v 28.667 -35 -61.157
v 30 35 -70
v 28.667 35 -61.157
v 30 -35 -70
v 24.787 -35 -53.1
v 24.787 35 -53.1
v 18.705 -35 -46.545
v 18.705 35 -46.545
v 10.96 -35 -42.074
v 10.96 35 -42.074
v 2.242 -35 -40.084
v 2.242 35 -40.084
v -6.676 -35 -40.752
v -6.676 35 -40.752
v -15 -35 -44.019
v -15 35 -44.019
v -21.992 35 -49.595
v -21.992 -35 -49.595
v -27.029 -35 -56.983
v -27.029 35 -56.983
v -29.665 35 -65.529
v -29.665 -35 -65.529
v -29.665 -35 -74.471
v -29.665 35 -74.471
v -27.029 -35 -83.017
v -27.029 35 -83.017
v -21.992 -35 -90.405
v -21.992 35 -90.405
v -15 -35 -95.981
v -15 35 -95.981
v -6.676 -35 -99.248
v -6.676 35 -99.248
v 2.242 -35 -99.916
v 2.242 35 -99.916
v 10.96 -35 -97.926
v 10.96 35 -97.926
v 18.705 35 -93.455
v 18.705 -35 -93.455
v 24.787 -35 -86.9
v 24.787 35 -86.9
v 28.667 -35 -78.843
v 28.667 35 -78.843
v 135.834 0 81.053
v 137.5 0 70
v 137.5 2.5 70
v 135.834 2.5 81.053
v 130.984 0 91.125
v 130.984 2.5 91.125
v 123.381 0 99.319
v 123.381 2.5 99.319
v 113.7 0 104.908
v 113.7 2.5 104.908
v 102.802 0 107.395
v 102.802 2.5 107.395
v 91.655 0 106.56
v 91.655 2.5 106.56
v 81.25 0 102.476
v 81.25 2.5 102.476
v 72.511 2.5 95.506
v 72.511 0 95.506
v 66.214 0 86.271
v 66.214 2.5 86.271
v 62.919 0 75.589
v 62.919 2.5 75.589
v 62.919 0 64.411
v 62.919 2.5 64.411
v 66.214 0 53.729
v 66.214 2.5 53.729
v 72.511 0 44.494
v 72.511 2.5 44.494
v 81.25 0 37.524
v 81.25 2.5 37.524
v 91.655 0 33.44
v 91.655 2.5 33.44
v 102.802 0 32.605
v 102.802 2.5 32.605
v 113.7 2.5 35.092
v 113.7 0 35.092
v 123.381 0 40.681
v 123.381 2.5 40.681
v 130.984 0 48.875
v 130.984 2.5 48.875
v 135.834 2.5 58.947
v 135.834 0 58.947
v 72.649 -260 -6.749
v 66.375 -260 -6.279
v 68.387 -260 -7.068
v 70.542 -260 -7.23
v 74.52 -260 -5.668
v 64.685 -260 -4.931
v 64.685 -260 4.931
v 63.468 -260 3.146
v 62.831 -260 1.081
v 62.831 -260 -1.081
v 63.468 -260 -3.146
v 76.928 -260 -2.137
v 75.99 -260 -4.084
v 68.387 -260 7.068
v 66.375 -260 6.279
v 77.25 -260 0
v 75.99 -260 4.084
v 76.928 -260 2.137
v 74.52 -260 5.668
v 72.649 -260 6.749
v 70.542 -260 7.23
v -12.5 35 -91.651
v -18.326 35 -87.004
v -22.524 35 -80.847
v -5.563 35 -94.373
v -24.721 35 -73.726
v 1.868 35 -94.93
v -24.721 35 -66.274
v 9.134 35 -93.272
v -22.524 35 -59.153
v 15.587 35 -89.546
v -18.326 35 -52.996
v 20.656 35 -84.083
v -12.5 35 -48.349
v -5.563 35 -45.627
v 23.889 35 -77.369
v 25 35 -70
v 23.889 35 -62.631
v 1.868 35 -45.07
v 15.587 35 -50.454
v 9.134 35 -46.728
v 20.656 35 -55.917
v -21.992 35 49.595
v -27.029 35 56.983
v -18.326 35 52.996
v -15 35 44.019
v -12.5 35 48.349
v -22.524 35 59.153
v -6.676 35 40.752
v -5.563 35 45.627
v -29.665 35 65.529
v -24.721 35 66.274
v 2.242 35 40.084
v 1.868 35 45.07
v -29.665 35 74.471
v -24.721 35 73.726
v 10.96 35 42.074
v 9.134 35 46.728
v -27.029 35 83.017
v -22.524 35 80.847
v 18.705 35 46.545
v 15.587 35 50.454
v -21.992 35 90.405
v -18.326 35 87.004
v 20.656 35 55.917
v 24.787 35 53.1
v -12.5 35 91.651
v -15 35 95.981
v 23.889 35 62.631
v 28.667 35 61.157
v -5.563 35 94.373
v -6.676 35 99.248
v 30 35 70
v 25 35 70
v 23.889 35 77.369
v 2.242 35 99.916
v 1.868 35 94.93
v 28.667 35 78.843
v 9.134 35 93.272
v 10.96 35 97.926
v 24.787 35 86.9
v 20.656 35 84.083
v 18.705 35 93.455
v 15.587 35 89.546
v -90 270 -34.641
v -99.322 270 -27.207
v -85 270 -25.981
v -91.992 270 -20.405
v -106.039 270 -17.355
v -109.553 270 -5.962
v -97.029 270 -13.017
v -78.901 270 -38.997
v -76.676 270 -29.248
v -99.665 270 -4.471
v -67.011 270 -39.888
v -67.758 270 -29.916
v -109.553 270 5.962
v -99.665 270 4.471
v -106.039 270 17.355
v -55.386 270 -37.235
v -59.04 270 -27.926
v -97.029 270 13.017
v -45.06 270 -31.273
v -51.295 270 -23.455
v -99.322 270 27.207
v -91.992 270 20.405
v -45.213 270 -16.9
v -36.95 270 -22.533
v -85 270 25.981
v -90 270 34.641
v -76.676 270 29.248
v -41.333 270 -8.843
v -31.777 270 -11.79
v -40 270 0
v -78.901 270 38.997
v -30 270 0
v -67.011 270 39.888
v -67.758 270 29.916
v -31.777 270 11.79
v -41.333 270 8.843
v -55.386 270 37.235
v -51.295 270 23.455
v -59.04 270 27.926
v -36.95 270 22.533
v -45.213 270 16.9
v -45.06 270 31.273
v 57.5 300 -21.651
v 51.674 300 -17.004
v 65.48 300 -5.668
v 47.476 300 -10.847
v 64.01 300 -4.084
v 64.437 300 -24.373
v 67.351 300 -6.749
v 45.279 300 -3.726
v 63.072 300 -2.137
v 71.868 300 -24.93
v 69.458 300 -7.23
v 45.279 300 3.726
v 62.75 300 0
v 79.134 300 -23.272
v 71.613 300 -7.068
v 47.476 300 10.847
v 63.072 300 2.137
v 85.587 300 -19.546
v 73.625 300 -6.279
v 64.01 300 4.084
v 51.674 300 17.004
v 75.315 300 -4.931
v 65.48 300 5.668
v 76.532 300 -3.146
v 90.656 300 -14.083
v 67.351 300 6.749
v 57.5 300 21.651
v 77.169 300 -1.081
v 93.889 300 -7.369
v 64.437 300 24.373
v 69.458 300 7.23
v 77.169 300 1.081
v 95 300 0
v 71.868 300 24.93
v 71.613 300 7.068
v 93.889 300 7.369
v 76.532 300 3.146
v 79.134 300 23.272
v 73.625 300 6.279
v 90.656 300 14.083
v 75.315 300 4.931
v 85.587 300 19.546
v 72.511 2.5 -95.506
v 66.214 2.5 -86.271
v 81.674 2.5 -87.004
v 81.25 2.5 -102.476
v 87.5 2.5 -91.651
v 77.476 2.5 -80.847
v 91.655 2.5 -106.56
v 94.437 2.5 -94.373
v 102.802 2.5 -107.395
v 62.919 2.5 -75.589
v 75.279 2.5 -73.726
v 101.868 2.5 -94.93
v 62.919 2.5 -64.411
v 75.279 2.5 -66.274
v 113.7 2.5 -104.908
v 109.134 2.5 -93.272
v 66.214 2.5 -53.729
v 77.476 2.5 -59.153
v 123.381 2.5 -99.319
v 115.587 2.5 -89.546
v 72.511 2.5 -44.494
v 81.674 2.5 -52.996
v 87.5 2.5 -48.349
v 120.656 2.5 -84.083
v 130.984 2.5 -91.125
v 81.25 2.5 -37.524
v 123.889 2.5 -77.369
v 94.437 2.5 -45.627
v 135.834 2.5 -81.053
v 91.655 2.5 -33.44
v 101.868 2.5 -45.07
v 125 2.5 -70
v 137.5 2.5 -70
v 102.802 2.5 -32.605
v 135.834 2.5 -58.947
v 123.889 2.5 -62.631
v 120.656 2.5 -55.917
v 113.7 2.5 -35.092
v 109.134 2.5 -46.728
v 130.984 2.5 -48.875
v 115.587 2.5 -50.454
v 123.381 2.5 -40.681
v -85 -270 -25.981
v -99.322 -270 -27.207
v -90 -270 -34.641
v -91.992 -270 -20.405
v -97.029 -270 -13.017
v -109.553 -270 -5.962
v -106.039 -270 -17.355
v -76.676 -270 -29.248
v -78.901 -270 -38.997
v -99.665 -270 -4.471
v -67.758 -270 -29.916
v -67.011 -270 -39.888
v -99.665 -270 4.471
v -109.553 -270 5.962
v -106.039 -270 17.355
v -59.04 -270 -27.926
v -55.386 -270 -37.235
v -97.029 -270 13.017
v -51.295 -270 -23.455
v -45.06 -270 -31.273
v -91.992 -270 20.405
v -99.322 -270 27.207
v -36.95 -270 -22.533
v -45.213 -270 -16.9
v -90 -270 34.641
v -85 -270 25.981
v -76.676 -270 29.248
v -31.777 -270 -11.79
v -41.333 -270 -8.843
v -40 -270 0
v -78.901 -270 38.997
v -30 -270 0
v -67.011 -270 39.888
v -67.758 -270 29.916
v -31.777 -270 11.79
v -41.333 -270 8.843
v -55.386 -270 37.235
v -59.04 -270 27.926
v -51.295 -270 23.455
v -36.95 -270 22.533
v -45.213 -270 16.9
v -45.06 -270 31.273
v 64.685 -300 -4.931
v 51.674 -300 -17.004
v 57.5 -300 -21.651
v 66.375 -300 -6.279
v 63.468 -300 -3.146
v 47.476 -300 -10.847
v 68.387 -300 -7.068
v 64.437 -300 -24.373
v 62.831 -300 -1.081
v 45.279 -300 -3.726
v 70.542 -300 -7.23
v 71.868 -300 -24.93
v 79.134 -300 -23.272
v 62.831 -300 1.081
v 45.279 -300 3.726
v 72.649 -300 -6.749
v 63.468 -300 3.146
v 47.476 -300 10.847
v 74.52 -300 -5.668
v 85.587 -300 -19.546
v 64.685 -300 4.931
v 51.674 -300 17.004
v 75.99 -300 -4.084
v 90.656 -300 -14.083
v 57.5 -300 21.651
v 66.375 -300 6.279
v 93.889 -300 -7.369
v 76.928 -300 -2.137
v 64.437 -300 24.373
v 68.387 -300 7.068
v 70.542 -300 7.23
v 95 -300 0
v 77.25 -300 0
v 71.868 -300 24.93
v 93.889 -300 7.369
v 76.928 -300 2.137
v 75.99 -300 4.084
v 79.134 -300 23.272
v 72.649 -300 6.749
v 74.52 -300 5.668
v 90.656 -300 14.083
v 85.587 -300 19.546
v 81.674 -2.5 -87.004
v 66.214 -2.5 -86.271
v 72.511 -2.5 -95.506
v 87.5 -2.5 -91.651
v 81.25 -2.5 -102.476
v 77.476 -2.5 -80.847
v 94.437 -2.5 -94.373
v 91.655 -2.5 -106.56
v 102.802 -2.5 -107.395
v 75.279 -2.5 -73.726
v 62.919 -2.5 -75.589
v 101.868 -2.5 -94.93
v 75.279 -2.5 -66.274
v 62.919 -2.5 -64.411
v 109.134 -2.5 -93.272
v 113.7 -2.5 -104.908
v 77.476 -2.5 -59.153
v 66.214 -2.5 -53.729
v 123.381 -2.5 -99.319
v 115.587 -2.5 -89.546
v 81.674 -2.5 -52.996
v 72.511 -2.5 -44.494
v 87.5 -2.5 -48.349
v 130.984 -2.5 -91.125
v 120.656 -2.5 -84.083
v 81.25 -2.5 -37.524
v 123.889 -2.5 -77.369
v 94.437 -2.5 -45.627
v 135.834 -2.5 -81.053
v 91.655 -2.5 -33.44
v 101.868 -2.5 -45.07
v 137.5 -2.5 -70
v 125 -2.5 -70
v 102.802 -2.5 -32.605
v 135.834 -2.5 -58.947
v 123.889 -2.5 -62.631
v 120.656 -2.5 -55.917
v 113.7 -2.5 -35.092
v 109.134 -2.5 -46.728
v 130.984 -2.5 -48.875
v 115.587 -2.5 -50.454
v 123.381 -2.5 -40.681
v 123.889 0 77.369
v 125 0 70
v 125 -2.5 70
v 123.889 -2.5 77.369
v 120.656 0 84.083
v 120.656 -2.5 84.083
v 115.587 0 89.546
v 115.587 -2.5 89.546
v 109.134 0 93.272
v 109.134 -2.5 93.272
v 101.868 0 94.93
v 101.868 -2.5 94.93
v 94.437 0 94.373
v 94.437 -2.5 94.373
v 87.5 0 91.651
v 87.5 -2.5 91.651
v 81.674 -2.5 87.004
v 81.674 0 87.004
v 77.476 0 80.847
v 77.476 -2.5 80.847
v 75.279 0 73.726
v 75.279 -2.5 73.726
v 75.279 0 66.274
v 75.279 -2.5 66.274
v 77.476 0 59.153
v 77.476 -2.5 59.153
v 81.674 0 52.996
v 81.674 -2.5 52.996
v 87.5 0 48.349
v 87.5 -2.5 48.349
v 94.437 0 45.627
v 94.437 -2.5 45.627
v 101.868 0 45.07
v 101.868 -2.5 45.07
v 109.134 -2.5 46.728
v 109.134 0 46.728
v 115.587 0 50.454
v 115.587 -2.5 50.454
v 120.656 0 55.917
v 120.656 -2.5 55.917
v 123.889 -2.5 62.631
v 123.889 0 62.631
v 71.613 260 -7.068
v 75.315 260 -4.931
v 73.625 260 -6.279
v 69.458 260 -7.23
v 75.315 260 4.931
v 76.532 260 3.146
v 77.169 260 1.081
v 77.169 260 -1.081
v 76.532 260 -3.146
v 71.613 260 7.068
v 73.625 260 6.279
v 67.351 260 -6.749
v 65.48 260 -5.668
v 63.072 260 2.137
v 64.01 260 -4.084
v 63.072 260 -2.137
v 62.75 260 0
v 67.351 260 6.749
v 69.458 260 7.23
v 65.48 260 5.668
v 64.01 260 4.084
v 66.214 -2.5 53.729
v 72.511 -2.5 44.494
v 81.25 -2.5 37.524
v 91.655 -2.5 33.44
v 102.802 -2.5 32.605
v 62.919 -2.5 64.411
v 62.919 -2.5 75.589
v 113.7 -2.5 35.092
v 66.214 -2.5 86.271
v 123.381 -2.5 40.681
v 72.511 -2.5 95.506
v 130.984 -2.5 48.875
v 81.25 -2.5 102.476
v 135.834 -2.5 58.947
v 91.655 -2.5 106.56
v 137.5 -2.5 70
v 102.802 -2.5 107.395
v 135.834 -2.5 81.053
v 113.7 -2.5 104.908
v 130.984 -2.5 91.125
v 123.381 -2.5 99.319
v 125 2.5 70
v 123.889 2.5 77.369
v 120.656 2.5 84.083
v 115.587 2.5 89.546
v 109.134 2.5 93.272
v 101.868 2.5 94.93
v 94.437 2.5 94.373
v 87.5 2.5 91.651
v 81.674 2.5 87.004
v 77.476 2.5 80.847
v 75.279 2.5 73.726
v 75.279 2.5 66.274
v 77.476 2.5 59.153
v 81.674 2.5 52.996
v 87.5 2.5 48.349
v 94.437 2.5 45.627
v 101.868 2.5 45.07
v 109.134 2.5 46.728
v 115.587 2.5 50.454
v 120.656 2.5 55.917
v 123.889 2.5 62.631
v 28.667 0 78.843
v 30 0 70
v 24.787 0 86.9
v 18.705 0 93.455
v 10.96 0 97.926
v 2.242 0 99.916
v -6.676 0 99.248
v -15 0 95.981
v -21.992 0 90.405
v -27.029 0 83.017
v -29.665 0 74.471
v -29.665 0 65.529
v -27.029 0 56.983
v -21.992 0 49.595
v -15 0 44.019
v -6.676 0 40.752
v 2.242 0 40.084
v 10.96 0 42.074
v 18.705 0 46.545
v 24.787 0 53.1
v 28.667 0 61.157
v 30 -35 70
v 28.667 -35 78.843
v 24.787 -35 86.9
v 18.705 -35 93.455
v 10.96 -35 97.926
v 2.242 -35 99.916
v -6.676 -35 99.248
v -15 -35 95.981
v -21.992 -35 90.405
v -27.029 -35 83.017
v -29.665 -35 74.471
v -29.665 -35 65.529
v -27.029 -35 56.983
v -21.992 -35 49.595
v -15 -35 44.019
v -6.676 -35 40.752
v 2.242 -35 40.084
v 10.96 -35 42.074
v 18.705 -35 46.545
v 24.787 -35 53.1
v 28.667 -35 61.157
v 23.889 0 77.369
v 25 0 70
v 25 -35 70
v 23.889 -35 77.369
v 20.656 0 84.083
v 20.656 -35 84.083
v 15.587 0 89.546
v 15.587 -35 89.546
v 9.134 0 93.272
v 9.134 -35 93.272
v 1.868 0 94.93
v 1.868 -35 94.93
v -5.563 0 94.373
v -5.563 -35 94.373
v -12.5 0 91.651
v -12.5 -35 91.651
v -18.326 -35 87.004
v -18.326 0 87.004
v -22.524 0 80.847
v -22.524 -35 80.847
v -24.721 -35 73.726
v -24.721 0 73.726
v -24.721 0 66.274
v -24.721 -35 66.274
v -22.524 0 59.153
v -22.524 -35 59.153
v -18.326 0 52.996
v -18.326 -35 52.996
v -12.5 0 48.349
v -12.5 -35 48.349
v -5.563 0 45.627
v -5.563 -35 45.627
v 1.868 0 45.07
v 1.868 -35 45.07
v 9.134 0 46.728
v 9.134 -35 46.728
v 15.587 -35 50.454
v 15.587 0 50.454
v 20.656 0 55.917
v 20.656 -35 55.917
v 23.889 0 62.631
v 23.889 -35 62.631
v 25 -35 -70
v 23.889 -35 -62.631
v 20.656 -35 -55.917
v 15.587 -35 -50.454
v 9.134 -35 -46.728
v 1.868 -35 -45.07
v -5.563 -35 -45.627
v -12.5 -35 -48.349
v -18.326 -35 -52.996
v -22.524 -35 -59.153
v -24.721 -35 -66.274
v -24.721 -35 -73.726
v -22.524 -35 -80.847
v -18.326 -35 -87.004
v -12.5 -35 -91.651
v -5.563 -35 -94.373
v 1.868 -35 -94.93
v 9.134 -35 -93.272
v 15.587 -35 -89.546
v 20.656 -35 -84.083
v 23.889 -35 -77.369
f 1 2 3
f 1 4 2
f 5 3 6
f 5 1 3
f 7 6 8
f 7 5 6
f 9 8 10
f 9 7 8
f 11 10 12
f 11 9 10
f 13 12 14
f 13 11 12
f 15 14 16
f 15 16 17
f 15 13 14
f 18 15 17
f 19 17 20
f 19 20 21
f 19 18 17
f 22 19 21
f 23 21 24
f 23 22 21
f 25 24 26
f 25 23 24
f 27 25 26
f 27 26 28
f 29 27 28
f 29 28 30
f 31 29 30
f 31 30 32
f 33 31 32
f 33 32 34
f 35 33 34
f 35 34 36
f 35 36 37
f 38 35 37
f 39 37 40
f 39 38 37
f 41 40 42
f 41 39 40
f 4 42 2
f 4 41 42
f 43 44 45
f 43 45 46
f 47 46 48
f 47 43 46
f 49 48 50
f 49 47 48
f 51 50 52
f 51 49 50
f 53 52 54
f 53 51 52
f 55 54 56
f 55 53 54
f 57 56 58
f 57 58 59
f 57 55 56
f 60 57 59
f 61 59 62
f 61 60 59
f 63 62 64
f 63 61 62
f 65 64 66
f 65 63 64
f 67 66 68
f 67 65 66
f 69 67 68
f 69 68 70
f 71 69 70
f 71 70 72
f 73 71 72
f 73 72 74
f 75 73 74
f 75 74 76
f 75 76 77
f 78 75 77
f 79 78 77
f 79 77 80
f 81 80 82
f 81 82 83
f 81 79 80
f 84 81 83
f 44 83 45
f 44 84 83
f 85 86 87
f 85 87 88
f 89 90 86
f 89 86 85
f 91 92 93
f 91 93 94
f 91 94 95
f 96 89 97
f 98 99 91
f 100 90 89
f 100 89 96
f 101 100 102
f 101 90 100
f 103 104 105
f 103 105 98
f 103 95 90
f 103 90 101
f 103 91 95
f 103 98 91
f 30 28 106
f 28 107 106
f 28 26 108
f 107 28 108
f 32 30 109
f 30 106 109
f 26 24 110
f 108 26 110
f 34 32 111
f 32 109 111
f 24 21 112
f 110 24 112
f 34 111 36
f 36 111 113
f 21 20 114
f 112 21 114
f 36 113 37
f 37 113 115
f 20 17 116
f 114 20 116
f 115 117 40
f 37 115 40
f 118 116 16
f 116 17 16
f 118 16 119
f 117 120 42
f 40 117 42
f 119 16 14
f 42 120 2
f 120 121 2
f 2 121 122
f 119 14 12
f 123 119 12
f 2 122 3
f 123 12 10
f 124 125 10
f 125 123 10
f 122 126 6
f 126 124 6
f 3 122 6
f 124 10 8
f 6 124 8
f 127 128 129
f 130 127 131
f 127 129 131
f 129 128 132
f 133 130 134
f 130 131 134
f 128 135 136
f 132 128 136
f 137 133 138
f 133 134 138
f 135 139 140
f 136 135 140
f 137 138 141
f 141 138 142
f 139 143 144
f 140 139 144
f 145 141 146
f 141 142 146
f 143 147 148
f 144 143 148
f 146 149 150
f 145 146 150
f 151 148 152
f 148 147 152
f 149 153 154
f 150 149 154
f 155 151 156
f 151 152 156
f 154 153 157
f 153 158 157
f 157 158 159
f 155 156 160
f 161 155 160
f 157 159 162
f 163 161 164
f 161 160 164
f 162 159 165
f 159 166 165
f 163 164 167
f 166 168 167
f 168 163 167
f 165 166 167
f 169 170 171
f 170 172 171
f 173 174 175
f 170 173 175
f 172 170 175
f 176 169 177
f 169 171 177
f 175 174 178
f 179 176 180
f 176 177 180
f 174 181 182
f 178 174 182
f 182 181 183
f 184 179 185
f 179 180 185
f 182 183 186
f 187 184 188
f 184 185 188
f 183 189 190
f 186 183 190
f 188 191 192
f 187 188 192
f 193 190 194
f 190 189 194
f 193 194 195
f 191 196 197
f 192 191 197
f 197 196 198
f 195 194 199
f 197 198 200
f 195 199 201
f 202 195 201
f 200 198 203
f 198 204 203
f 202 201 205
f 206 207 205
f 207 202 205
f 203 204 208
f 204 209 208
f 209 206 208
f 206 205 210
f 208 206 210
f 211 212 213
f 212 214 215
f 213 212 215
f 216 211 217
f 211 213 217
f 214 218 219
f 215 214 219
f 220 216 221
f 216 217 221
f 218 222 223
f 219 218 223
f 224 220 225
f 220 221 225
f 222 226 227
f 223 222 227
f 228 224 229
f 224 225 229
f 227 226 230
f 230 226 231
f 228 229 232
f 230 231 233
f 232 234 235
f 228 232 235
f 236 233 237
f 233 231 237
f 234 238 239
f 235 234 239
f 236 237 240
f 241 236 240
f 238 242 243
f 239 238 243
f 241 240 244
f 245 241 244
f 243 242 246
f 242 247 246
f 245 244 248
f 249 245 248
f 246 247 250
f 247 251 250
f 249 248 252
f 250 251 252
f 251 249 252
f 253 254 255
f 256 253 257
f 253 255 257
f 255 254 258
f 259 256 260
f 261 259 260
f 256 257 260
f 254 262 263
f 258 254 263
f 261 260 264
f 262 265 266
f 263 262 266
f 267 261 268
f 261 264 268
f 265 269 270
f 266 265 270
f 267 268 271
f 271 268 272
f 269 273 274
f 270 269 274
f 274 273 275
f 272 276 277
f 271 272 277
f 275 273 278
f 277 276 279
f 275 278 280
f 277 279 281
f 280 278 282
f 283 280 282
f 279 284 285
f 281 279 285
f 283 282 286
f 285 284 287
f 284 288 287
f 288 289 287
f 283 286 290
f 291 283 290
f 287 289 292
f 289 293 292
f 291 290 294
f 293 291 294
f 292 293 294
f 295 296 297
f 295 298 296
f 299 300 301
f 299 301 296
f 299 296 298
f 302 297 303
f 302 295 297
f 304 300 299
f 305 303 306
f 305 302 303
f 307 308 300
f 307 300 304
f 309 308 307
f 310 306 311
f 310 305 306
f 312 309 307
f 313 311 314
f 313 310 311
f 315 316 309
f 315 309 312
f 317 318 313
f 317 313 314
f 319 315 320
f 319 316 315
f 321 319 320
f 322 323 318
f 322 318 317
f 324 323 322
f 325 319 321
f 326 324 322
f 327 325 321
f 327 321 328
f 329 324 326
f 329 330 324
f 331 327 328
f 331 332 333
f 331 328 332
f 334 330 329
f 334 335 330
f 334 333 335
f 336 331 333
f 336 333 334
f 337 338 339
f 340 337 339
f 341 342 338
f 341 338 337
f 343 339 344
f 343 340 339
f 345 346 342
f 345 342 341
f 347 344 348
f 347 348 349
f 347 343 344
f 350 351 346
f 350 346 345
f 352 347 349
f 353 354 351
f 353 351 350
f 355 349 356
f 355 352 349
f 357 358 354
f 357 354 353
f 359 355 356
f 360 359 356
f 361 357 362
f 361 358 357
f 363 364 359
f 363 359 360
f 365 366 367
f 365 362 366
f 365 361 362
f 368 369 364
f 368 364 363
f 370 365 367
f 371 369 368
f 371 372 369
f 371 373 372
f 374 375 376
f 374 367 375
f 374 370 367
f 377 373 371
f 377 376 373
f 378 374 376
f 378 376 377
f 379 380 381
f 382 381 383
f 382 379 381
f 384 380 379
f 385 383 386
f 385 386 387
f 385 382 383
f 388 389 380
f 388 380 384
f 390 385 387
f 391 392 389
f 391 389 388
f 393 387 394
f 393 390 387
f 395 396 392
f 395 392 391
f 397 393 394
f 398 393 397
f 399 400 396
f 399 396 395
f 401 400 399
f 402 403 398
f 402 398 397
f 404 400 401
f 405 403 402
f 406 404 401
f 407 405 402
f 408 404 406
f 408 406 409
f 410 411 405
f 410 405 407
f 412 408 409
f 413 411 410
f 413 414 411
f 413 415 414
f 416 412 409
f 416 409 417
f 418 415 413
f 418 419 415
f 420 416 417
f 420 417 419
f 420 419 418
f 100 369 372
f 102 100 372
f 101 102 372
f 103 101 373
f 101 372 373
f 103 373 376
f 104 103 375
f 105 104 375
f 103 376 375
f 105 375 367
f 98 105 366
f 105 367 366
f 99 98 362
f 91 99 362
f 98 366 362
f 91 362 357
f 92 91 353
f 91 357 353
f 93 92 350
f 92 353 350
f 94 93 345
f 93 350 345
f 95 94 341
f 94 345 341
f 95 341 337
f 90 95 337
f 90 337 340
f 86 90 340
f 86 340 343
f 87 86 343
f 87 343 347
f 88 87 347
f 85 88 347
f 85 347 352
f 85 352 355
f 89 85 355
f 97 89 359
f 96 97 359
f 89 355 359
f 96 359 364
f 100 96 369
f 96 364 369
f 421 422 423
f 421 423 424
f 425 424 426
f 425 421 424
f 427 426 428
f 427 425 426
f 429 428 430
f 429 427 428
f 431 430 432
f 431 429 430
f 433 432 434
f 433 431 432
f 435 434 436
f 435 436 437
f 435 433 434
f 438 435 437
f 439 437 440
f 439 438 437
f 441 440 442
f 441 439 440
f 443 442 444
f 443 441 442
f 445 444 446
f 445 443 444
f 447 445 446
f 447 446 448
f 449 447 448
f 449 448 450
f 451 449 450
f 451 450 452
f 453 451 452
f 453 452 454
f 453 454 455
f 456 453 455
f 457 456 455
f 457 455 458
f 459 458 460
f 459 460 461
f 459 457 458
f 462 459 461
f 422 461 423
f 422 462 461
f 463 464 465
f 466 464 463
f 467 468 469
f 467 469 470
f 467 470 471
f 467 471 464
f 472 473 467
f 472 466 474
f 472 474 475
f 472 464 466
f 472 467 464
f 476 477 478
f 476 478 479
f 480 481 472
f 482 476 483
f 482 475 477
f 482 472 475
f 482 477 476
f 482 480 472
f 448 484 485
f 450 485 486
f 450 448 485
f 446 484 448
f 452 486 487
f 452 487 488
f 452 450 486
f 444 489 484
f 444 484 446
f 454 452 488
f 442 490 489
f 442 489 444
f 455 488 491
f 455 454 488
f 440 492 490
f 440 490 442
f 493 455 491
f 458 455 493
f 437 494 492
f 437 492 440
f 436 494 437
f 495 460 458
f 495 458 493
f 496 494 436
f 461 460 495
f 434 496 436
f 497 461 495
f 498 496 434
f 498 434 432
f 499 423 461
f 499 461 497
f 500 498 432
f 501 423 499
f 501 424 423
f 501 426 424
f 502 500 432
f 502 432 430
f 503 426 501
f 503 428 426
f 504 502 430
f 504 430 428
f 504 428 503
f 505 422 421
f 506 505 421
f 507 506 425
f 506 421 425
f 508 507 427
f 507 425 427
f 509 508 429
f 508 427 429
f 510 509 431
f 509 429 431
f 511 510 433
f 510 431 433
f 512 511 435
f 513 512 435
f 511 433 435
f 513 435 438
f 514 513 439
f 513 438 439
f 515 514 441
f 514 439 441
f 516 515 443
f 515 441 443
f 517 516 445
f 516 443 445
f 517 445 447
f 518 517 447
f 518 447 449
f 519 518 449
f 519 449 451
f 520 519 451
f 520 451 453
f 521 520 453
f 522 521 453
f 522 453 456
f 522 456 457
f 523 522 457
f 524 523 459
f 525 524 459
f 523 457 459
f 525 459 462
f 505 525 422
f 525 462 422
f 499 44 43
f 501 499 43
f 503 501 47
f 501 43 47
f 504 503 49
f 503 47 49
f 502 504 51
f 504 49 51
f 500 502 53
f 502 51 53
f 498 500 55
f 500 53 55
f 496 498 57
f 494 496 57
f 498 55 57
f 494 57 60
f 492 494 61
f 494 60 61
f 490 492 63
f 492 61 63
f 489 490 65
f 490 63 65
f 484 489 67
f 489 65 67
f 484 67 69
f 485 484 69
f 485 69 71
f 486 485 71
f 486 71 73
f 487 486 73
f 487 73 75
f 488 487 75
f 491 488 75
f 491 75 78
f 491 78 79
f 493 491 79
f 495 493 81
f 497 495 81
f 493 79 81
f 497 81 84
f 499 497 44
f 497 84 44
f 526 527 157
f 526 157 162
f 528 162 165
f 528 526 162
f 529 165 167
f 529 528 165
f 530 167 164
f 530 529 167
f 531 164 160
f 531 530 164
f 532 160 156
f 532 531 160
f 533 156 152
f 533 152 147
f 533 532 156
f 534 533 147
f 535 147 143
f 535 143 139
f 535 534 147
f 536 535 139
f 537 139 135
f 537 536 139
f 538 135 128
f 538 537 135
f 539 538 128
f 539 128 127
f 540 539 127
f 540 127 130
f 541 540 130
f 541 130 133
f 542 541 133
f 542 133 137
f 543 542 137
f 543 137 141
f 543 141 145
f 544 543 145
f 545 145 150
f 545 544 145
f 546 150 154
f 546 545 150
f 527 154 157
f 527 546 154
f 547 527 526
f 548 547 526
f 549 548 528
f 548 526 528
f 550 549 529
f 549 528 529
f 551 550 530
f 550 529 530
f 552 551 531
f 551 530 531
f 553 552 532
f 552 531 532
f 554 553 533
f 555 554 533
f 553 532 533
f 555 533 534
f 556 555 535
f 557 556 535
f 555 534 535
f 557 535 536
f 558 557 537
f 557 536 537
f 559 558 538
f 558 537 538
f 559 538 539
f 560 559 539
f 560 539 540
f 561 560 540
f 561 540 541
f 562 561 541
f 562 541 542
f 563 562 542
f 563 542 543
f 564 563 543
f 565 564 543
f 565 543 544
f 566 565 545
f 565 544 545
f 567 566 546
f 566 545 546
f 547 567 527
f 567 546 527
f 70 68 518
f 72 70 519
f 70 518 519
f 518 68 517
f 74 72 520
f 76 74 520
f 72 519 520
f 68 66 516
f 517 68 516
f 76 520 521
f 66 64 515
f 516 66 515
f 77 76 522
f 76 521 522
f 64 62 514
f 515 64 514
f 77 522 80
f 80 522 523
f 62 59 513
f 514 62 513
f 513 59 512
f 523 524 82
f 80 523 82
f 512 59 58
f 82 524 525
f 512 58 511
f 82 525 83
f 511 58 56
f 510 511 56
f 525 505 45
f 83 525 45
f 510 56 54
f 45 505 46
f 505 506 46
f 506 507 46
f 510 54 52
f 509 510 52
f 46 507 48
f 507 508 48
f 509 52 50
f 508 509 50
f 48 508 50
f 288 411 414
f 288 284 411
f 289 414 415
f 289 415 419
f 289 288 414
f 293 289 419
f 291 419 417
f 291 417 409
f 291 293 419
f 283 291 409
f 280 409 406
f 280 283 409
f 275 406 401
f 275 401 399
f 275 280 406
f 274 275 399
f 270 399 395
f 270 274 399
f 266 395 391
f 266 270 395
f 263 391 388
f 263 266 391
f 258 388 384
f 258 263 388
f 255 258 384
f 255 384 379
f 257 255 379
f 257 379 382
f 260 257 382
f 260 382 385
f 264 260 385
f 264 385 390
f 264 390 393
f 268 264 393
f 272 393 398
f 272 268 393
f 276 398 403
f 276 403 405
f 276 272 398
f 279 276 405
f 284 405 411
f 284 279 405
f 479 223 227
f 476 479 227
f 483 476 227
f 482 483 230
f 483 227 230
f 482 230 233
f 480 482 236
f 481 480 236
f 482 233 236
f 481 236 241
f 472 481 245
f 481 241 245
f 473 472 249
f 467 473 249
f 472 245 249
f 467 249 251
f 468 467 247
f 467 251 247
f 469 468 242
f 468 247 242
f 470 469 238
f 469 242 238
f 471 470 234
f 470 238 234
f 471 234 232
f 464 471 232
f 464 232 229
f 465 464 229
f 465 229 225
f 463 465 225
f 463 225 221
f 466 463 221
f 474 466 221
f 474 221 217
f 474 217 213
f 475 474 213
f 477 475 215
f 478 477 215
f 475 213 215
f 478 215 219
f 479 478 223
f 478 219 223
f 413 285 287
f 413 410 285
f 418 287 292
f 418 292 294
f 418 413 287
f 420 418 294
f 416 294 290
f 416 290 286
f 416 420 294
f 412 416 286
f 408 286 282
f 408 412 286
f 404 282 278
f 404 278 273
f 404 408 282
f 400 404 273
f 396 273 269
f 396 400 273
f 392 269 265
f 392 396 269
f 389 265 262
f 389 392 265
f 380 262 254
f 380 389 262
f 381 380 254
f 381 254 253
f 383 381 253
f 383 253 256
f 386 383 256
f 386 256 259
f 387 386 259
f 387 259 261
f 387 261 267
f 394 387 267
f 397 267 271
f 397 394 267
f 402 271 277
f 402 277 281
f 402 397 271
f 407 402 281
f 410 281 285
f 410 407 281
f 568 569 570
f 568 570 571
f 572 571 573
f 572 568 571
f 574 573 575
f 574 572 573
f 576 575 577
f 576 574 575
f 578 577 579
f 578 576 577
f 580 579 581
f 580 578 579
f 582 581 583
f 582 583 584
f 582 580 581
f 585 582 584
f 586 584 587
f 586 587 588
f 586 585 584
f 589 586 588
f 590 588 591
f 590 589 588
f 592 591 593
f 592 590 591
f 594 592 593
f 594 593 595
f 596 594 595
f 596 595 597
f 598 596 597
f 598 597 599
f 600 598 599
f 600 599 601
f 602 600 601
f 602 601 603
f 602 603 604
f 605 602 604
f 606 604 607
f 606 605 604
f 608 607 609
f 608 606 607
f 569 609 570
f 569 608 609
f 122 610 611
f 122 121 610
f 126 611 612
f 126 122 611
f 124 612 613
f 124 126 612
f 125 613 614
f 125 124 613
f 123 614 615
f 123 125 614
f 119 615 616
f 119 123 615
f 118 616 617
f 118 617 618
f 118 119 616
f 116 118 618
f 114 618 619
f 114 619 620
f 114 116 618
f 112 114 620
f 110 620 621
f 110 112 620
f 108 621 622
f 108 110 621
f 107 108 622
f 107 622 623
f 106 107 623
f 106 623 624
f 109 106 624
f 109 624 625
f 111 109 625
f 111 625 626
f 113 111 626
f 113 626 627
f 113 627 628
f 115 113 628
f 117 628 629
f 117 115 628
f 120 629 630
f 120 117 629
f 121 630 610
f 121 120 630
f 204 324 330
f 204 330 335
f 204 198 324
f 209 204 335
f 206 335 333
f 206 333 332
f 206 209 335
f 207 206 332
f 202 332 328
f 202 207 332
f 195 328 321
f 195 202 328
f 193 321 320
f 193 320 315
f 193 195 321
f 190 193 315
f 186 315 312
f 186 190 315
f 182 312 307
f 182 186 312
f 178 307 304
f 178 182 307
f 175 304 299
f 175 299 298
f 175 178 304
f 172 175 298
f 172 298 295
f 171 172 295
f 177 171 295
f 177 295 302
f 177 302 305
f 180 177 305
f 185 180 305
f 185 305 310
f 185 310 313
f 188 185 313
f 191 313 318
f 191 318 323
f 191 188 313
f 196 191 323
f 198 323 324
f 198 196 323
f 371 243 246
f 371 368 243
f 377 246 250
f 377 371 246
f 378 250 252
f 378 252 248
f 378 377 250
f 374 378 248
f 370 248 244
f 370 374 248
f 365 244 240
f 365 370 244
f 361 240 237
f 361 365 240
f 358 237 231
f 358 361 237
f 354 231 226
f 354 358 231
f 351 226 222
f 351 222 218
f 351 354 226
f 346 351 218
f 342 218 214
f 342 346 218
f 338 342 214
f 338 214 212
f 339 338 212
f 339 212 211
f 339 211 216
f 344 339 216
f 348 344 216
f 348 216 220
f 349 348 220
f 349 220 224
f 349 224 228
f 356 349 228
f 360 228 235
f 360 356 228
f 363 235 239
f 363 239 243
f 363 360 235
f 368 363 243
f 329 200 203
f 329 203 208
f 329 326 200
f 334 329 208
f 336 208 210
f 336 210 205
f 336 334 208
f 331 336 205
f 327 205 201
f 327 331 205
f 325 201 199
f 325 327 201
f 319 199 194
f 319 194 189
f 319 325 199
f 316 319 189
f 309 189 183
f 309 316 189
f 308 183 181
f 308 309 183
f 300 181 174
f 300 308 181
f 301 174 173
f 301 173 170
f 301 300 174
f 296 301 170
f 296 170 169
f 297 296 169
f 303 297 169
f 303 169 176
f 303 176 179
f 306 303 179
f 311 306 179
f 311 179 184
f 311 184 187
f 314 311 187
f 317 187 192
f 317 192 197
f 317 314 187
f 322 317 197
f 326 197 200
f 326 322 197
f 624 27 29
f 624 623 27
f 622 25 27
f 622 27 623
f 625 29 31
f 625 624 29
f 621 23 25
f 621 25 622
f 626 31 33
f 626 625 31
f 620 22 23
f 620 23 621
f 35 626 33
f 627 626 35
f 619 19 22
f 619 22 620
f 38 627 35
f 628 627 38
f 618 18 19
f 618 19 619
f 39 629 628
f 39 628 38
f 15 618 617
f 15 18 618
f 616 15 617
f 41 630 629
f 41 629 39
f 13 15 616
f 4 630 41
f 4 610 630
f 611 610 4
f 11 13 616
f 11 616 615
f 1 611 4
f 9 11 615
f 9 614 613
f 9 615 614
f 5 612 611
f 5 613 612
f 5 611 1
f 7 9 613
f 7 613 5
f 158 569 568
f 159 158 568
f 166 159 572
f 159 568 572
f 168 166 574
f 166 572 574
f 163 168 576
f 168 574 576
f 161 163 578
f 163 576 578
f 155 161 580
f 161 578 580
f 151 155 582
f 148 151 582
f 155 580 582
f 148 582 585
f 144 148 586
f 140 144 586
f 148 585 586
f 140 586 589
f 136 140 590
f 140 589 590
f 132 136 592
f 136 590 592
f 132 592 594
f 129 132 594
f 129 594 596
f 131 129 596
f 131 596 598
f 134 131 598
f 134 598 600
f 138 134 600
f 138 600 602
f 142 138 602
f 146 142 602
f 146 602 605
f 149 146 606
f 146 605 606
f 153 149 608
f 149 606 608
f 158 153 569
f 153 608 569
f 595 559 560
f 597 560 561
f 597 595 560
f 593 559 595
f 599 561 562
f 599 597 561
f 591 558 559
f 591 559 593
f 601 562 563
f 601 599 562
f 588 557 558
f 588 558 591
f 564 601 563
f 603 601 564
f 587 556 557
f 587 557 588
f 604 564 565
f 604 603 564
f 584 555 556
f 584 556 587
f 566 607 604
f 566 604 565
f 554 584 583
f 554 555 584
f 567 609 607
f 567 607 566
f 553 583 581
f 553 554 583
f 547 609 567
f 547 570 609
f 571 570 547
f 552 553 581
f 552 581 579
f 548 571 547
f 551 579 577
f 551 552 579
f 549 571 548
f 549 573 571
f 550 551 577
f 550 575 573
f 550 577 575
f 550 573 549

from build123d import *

# Parameters (mm, degrees)
F0_R      = 40
F0_R_2    = 30
F1_DEPTH  = 270
F2_R      = 30
F2_R_2    = 25
F3_DEPTH  = 35
F4_R      = 25
F5_DEPTH  = 300
F6_R      = 37.5
F6_R_2    = 25
F7_DEPTH  = 2.5
F8_R      = 7.25
F9_DEPTH  = 40
F10_R     = 7.25
F11_DEPTH = 40


with BuildPart() as f1:
    # F0 (on Front) → F1 (new body, symmetric)
    with BuildSketch(Plane.XZ):
        with Locations((-70, 0)):
            Circle(F0_R)
        with Locations((-70, 0)):
            Circle(F0_R_2, mode=Mode.SUBTRACT)
    extrude(amount=F1_DEPTH, both=True)


with BuildPart() as f3:
    # F2 (on Front) → F3 (new body, symmetric)
    with BuildSketch(Plane.XZ):
        with Locations((0, 70)):
            Circle(F2_R)
        with Locations((0, 70)):
            Circle(F2_R_2, mode=Mode.SUBTRACT)
        with Locations((0, -70)):
            Circle(F2_R)
        with Locations((0, -70)):
            Circle(F2_R_2, mode=Mode.SUBTRACT)
    extrude(amount=F3_DEPTH, both=True)


with BuildPart() as f5:
    # F4 (on Front) → F5 (new body, symmetric)
    with BuildSketch(Plane.XZ):
        with Locations((70, 0)):
            Circle(F4_R)
    extrude(amount=F5_DEPTH, both=True)

    # F8 (on face) → F9 (cut)
    with BuildSketch(Plane.XZ.offset(300)):
        with Locations((70, 0)):
            Circle(F8_R)
    extrude(amount=-F9_DEPTH, mode=Mode.SUBTRACT)

    # F10 (on face) → F11 (cut)
    with BuildSketch(Plane(origin=(0, 300, 0), x_dir=(-1, 0, 0), z_dir=(0, 1, 0))):
        with Locations((-70, 0)):
            Circle(F10_R)
    extrude(amount=-F11_DEPTH, mode=Mode.SUBTRACT)


with BuildPart() as f7:
    # F6 (on Front) → F7 (new body, symmetric)
    with BuildSketch(Plane.XZ):
        with Locations((100, 70)):
            Circle(F6_R)
        with Locations((100, 70)):
            Circle(F6_R_2, mode=Mode.SUBTRACT)
        with Locations((100, -70)):
            Circle(F6_R)
        with Locations((100, -70)):
            Circle(F6_R_2, mode=Mode.SUBTRACT)
    extrude(amount=F7_DEPTH, both=True)


solid = Compound([f1.part, f3.part, f5.part, f7.part])
